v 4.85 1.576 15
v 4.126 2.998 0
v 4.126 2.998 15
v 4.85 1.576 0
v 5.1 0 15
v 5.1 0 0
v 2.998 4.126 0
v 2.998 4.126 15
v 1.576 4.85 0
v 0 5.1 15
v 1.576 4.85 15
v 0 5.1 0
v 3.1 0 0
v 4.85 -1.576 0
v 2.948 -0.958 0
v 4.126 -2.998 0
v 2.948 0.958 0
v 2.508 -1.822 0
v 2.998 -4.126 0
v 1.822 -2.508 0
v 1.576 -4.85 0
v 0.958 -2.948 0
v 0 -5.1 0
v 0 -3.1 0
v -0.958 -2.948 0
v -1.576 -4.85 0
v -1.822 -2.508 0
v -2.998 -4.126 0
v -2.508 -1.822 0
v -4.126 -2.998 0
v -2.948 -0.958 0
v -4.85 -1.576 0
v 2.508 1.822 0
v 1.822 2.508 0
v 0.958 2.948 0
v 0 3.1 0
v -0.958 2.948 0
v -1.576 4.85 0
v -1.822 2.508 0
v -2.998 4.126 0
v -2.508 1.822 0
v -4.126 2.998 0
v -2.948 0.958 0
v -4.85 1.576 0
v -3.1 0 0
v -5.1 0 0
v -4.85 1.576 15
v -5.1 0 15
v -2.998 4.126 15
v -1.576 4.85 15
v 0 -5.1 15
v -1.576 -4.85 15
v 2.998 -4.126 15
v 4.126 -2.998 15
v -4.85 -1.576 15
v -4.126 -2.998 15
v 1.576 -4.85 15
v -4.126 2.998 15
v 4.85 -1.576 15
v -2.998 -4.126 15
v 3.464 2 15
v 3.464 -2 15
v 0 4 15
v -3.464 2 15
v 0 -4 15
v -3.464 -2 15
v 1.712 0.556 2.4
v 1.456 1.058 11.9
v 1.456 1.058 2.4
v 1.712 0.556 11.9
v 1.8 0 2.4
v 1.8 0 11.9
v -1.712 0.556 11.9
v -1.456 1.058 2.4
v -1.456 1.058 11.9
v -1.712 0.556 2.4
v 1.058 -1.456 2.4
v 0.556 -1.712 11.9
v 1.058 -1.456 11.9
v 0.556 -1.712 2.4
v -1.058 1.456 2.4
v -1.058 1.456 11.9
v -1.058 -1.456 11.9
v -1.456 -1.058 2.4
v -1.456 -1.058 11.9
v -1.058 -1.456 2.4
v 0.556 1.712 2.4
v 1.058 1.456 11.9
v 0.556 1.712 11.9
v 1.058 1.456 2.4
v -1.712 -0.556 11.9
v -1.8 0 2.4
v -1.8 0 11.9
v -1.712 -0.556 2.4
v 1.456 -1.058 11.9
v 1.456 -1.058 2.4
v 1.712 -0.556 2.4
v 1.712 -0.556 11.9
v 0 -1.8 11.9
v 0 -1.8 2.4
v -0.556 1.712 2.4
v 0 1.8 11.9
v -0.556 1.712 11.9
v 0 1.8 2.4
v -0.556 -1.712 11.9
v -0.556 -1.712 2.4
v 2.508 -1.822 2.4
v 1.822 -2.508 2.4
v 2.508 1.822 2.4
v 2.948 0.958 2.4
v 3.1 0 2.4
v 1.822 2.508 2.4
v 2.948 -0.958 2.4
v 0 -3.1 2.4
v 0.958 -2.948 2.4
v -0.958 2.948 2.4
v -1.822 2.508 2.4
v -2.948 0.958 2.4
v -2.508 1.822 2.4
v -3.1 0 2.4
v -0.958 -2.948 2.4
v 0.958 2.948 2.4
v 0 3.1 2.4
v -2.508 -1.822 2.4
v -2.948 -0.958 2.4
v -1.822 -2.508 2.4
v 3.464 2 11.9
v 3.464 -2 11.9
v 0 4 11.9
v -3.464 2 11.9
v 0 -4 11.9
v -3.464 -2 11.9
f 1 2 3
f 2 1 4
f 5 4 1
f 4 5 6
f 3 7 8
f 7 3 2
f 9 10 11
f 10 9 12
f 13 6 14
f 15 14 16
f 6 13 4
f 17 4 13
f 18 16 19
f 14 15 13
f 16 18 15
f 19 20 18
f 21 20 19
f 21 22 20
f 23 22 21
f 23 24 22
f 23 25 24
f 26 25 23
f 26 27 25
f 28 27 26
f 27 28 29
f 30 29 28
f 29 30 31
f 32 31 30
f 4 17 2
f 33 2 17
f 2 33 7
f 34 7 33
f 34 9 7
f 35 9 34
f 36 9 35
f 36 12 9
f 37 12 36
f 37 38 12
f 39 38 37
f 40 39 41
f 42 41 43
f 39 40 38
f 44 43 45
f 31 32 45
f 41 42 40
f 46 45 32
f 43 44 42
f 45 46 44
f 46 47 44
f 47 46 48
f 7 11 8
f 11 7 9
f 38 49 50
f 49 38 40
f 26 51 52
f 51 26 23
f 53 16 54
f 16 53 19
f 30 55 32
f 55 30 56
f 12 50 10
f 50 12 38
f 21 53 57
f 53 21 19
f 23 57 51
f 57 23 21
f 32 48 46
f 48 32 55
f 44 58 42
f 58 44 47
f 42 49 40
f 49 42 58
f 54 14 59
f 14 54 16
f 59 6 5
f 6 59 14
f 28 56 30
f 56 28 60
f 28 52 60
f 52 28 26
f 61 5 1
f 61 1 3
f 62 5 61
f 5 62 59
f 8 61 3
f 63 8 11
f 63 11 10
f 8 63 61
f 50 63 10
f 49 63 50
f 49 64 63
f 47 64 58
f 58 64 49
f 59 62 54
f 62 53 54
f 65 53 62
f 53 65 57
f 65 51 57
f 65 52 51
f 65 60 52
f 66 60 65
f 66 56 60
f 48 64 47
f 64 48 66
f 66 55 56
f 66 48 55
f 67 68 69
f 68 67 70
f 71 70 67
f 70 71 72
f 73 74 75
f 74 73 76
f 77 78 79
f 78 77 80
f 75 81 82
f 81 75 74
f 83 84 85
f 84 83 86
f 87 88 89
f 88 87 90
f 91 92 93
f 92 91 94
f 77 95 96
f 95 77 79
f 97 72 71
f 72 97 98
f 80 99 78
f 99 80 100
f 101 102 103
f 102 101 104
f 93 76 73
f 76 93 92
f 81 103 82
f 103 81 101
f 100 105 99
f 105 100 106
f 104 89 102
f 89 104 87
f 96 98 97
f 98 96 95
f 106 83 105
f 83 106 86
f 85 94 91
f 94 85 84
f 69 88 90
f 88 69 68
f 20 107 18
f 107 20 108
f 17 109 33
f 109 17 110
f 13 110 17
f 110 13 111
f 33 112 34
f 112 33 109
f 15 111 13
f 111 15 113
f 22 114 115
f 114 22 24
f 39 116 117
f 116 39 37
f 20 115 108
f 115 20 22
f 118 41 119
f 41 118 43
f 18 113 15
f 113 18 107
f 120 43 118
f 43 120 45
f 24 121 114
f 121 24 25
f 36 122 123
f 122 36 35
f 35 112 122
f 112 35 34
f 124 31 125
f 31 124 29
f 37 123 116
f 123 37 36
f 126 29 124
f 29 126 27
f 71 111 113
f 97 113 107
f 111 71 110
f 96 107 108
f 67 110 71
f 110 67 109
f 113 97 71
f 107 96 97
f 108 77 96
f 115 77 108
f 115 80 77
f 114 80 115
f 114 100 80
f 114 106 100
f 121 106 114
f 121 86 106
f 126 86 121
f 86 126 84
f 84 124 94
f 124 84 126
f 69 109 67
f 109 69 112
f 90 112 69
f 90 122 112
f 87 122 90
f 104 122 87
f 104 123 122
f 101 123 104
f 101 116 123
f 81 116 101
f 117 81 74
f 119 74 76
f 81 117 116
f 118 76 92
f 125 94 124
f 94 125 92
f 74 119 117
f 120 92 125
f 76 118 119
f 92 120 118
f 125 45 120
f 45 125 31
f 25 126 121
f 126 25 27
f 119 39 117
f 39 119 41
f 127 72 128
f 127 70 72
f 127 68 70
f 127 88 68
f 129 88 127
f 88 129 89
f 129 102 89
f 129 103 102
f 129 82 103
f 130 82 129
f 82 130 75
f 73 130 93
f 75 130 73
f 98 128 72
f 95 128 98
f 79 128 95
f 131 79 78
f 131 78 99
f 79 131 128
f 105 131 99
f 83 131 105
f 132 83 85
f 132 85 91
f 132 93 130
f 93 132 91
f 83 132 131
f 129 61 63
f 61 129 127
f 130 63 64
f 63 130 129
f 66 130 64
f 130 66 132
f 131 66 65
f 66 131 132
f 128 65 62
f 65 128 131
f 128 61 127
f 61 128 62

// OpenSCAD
r1i = 3.1;
r1o = r1i + 2.0;
h1i = 2.4;
h1o = 5.0;

r2i = 3.6/2; // M4
r2o = r1o; // r2i + 2.2;
h2 = 10;

nut_r = 8.0/2; // M4
nut_h = 3.2;

$fn=20;

difference() {
  union() {
    cylinder( h=h1o, r=r1o );
    translate( [0,0,h1o] ) cylinder( h=h2, r=r2o );
  }
  cylinder( h=h1o + h2, r=r2i );
  cylinder( h=h1i, r=r1i );
  translate([0,0,h1o+h2-nut_h+0.1]) linear_extrude(nut_h)
    polygon( [ for (a = [0 : 60 : 359]) [ nut_r * sin(a), nut_r * cos(a) ] ] );
}
